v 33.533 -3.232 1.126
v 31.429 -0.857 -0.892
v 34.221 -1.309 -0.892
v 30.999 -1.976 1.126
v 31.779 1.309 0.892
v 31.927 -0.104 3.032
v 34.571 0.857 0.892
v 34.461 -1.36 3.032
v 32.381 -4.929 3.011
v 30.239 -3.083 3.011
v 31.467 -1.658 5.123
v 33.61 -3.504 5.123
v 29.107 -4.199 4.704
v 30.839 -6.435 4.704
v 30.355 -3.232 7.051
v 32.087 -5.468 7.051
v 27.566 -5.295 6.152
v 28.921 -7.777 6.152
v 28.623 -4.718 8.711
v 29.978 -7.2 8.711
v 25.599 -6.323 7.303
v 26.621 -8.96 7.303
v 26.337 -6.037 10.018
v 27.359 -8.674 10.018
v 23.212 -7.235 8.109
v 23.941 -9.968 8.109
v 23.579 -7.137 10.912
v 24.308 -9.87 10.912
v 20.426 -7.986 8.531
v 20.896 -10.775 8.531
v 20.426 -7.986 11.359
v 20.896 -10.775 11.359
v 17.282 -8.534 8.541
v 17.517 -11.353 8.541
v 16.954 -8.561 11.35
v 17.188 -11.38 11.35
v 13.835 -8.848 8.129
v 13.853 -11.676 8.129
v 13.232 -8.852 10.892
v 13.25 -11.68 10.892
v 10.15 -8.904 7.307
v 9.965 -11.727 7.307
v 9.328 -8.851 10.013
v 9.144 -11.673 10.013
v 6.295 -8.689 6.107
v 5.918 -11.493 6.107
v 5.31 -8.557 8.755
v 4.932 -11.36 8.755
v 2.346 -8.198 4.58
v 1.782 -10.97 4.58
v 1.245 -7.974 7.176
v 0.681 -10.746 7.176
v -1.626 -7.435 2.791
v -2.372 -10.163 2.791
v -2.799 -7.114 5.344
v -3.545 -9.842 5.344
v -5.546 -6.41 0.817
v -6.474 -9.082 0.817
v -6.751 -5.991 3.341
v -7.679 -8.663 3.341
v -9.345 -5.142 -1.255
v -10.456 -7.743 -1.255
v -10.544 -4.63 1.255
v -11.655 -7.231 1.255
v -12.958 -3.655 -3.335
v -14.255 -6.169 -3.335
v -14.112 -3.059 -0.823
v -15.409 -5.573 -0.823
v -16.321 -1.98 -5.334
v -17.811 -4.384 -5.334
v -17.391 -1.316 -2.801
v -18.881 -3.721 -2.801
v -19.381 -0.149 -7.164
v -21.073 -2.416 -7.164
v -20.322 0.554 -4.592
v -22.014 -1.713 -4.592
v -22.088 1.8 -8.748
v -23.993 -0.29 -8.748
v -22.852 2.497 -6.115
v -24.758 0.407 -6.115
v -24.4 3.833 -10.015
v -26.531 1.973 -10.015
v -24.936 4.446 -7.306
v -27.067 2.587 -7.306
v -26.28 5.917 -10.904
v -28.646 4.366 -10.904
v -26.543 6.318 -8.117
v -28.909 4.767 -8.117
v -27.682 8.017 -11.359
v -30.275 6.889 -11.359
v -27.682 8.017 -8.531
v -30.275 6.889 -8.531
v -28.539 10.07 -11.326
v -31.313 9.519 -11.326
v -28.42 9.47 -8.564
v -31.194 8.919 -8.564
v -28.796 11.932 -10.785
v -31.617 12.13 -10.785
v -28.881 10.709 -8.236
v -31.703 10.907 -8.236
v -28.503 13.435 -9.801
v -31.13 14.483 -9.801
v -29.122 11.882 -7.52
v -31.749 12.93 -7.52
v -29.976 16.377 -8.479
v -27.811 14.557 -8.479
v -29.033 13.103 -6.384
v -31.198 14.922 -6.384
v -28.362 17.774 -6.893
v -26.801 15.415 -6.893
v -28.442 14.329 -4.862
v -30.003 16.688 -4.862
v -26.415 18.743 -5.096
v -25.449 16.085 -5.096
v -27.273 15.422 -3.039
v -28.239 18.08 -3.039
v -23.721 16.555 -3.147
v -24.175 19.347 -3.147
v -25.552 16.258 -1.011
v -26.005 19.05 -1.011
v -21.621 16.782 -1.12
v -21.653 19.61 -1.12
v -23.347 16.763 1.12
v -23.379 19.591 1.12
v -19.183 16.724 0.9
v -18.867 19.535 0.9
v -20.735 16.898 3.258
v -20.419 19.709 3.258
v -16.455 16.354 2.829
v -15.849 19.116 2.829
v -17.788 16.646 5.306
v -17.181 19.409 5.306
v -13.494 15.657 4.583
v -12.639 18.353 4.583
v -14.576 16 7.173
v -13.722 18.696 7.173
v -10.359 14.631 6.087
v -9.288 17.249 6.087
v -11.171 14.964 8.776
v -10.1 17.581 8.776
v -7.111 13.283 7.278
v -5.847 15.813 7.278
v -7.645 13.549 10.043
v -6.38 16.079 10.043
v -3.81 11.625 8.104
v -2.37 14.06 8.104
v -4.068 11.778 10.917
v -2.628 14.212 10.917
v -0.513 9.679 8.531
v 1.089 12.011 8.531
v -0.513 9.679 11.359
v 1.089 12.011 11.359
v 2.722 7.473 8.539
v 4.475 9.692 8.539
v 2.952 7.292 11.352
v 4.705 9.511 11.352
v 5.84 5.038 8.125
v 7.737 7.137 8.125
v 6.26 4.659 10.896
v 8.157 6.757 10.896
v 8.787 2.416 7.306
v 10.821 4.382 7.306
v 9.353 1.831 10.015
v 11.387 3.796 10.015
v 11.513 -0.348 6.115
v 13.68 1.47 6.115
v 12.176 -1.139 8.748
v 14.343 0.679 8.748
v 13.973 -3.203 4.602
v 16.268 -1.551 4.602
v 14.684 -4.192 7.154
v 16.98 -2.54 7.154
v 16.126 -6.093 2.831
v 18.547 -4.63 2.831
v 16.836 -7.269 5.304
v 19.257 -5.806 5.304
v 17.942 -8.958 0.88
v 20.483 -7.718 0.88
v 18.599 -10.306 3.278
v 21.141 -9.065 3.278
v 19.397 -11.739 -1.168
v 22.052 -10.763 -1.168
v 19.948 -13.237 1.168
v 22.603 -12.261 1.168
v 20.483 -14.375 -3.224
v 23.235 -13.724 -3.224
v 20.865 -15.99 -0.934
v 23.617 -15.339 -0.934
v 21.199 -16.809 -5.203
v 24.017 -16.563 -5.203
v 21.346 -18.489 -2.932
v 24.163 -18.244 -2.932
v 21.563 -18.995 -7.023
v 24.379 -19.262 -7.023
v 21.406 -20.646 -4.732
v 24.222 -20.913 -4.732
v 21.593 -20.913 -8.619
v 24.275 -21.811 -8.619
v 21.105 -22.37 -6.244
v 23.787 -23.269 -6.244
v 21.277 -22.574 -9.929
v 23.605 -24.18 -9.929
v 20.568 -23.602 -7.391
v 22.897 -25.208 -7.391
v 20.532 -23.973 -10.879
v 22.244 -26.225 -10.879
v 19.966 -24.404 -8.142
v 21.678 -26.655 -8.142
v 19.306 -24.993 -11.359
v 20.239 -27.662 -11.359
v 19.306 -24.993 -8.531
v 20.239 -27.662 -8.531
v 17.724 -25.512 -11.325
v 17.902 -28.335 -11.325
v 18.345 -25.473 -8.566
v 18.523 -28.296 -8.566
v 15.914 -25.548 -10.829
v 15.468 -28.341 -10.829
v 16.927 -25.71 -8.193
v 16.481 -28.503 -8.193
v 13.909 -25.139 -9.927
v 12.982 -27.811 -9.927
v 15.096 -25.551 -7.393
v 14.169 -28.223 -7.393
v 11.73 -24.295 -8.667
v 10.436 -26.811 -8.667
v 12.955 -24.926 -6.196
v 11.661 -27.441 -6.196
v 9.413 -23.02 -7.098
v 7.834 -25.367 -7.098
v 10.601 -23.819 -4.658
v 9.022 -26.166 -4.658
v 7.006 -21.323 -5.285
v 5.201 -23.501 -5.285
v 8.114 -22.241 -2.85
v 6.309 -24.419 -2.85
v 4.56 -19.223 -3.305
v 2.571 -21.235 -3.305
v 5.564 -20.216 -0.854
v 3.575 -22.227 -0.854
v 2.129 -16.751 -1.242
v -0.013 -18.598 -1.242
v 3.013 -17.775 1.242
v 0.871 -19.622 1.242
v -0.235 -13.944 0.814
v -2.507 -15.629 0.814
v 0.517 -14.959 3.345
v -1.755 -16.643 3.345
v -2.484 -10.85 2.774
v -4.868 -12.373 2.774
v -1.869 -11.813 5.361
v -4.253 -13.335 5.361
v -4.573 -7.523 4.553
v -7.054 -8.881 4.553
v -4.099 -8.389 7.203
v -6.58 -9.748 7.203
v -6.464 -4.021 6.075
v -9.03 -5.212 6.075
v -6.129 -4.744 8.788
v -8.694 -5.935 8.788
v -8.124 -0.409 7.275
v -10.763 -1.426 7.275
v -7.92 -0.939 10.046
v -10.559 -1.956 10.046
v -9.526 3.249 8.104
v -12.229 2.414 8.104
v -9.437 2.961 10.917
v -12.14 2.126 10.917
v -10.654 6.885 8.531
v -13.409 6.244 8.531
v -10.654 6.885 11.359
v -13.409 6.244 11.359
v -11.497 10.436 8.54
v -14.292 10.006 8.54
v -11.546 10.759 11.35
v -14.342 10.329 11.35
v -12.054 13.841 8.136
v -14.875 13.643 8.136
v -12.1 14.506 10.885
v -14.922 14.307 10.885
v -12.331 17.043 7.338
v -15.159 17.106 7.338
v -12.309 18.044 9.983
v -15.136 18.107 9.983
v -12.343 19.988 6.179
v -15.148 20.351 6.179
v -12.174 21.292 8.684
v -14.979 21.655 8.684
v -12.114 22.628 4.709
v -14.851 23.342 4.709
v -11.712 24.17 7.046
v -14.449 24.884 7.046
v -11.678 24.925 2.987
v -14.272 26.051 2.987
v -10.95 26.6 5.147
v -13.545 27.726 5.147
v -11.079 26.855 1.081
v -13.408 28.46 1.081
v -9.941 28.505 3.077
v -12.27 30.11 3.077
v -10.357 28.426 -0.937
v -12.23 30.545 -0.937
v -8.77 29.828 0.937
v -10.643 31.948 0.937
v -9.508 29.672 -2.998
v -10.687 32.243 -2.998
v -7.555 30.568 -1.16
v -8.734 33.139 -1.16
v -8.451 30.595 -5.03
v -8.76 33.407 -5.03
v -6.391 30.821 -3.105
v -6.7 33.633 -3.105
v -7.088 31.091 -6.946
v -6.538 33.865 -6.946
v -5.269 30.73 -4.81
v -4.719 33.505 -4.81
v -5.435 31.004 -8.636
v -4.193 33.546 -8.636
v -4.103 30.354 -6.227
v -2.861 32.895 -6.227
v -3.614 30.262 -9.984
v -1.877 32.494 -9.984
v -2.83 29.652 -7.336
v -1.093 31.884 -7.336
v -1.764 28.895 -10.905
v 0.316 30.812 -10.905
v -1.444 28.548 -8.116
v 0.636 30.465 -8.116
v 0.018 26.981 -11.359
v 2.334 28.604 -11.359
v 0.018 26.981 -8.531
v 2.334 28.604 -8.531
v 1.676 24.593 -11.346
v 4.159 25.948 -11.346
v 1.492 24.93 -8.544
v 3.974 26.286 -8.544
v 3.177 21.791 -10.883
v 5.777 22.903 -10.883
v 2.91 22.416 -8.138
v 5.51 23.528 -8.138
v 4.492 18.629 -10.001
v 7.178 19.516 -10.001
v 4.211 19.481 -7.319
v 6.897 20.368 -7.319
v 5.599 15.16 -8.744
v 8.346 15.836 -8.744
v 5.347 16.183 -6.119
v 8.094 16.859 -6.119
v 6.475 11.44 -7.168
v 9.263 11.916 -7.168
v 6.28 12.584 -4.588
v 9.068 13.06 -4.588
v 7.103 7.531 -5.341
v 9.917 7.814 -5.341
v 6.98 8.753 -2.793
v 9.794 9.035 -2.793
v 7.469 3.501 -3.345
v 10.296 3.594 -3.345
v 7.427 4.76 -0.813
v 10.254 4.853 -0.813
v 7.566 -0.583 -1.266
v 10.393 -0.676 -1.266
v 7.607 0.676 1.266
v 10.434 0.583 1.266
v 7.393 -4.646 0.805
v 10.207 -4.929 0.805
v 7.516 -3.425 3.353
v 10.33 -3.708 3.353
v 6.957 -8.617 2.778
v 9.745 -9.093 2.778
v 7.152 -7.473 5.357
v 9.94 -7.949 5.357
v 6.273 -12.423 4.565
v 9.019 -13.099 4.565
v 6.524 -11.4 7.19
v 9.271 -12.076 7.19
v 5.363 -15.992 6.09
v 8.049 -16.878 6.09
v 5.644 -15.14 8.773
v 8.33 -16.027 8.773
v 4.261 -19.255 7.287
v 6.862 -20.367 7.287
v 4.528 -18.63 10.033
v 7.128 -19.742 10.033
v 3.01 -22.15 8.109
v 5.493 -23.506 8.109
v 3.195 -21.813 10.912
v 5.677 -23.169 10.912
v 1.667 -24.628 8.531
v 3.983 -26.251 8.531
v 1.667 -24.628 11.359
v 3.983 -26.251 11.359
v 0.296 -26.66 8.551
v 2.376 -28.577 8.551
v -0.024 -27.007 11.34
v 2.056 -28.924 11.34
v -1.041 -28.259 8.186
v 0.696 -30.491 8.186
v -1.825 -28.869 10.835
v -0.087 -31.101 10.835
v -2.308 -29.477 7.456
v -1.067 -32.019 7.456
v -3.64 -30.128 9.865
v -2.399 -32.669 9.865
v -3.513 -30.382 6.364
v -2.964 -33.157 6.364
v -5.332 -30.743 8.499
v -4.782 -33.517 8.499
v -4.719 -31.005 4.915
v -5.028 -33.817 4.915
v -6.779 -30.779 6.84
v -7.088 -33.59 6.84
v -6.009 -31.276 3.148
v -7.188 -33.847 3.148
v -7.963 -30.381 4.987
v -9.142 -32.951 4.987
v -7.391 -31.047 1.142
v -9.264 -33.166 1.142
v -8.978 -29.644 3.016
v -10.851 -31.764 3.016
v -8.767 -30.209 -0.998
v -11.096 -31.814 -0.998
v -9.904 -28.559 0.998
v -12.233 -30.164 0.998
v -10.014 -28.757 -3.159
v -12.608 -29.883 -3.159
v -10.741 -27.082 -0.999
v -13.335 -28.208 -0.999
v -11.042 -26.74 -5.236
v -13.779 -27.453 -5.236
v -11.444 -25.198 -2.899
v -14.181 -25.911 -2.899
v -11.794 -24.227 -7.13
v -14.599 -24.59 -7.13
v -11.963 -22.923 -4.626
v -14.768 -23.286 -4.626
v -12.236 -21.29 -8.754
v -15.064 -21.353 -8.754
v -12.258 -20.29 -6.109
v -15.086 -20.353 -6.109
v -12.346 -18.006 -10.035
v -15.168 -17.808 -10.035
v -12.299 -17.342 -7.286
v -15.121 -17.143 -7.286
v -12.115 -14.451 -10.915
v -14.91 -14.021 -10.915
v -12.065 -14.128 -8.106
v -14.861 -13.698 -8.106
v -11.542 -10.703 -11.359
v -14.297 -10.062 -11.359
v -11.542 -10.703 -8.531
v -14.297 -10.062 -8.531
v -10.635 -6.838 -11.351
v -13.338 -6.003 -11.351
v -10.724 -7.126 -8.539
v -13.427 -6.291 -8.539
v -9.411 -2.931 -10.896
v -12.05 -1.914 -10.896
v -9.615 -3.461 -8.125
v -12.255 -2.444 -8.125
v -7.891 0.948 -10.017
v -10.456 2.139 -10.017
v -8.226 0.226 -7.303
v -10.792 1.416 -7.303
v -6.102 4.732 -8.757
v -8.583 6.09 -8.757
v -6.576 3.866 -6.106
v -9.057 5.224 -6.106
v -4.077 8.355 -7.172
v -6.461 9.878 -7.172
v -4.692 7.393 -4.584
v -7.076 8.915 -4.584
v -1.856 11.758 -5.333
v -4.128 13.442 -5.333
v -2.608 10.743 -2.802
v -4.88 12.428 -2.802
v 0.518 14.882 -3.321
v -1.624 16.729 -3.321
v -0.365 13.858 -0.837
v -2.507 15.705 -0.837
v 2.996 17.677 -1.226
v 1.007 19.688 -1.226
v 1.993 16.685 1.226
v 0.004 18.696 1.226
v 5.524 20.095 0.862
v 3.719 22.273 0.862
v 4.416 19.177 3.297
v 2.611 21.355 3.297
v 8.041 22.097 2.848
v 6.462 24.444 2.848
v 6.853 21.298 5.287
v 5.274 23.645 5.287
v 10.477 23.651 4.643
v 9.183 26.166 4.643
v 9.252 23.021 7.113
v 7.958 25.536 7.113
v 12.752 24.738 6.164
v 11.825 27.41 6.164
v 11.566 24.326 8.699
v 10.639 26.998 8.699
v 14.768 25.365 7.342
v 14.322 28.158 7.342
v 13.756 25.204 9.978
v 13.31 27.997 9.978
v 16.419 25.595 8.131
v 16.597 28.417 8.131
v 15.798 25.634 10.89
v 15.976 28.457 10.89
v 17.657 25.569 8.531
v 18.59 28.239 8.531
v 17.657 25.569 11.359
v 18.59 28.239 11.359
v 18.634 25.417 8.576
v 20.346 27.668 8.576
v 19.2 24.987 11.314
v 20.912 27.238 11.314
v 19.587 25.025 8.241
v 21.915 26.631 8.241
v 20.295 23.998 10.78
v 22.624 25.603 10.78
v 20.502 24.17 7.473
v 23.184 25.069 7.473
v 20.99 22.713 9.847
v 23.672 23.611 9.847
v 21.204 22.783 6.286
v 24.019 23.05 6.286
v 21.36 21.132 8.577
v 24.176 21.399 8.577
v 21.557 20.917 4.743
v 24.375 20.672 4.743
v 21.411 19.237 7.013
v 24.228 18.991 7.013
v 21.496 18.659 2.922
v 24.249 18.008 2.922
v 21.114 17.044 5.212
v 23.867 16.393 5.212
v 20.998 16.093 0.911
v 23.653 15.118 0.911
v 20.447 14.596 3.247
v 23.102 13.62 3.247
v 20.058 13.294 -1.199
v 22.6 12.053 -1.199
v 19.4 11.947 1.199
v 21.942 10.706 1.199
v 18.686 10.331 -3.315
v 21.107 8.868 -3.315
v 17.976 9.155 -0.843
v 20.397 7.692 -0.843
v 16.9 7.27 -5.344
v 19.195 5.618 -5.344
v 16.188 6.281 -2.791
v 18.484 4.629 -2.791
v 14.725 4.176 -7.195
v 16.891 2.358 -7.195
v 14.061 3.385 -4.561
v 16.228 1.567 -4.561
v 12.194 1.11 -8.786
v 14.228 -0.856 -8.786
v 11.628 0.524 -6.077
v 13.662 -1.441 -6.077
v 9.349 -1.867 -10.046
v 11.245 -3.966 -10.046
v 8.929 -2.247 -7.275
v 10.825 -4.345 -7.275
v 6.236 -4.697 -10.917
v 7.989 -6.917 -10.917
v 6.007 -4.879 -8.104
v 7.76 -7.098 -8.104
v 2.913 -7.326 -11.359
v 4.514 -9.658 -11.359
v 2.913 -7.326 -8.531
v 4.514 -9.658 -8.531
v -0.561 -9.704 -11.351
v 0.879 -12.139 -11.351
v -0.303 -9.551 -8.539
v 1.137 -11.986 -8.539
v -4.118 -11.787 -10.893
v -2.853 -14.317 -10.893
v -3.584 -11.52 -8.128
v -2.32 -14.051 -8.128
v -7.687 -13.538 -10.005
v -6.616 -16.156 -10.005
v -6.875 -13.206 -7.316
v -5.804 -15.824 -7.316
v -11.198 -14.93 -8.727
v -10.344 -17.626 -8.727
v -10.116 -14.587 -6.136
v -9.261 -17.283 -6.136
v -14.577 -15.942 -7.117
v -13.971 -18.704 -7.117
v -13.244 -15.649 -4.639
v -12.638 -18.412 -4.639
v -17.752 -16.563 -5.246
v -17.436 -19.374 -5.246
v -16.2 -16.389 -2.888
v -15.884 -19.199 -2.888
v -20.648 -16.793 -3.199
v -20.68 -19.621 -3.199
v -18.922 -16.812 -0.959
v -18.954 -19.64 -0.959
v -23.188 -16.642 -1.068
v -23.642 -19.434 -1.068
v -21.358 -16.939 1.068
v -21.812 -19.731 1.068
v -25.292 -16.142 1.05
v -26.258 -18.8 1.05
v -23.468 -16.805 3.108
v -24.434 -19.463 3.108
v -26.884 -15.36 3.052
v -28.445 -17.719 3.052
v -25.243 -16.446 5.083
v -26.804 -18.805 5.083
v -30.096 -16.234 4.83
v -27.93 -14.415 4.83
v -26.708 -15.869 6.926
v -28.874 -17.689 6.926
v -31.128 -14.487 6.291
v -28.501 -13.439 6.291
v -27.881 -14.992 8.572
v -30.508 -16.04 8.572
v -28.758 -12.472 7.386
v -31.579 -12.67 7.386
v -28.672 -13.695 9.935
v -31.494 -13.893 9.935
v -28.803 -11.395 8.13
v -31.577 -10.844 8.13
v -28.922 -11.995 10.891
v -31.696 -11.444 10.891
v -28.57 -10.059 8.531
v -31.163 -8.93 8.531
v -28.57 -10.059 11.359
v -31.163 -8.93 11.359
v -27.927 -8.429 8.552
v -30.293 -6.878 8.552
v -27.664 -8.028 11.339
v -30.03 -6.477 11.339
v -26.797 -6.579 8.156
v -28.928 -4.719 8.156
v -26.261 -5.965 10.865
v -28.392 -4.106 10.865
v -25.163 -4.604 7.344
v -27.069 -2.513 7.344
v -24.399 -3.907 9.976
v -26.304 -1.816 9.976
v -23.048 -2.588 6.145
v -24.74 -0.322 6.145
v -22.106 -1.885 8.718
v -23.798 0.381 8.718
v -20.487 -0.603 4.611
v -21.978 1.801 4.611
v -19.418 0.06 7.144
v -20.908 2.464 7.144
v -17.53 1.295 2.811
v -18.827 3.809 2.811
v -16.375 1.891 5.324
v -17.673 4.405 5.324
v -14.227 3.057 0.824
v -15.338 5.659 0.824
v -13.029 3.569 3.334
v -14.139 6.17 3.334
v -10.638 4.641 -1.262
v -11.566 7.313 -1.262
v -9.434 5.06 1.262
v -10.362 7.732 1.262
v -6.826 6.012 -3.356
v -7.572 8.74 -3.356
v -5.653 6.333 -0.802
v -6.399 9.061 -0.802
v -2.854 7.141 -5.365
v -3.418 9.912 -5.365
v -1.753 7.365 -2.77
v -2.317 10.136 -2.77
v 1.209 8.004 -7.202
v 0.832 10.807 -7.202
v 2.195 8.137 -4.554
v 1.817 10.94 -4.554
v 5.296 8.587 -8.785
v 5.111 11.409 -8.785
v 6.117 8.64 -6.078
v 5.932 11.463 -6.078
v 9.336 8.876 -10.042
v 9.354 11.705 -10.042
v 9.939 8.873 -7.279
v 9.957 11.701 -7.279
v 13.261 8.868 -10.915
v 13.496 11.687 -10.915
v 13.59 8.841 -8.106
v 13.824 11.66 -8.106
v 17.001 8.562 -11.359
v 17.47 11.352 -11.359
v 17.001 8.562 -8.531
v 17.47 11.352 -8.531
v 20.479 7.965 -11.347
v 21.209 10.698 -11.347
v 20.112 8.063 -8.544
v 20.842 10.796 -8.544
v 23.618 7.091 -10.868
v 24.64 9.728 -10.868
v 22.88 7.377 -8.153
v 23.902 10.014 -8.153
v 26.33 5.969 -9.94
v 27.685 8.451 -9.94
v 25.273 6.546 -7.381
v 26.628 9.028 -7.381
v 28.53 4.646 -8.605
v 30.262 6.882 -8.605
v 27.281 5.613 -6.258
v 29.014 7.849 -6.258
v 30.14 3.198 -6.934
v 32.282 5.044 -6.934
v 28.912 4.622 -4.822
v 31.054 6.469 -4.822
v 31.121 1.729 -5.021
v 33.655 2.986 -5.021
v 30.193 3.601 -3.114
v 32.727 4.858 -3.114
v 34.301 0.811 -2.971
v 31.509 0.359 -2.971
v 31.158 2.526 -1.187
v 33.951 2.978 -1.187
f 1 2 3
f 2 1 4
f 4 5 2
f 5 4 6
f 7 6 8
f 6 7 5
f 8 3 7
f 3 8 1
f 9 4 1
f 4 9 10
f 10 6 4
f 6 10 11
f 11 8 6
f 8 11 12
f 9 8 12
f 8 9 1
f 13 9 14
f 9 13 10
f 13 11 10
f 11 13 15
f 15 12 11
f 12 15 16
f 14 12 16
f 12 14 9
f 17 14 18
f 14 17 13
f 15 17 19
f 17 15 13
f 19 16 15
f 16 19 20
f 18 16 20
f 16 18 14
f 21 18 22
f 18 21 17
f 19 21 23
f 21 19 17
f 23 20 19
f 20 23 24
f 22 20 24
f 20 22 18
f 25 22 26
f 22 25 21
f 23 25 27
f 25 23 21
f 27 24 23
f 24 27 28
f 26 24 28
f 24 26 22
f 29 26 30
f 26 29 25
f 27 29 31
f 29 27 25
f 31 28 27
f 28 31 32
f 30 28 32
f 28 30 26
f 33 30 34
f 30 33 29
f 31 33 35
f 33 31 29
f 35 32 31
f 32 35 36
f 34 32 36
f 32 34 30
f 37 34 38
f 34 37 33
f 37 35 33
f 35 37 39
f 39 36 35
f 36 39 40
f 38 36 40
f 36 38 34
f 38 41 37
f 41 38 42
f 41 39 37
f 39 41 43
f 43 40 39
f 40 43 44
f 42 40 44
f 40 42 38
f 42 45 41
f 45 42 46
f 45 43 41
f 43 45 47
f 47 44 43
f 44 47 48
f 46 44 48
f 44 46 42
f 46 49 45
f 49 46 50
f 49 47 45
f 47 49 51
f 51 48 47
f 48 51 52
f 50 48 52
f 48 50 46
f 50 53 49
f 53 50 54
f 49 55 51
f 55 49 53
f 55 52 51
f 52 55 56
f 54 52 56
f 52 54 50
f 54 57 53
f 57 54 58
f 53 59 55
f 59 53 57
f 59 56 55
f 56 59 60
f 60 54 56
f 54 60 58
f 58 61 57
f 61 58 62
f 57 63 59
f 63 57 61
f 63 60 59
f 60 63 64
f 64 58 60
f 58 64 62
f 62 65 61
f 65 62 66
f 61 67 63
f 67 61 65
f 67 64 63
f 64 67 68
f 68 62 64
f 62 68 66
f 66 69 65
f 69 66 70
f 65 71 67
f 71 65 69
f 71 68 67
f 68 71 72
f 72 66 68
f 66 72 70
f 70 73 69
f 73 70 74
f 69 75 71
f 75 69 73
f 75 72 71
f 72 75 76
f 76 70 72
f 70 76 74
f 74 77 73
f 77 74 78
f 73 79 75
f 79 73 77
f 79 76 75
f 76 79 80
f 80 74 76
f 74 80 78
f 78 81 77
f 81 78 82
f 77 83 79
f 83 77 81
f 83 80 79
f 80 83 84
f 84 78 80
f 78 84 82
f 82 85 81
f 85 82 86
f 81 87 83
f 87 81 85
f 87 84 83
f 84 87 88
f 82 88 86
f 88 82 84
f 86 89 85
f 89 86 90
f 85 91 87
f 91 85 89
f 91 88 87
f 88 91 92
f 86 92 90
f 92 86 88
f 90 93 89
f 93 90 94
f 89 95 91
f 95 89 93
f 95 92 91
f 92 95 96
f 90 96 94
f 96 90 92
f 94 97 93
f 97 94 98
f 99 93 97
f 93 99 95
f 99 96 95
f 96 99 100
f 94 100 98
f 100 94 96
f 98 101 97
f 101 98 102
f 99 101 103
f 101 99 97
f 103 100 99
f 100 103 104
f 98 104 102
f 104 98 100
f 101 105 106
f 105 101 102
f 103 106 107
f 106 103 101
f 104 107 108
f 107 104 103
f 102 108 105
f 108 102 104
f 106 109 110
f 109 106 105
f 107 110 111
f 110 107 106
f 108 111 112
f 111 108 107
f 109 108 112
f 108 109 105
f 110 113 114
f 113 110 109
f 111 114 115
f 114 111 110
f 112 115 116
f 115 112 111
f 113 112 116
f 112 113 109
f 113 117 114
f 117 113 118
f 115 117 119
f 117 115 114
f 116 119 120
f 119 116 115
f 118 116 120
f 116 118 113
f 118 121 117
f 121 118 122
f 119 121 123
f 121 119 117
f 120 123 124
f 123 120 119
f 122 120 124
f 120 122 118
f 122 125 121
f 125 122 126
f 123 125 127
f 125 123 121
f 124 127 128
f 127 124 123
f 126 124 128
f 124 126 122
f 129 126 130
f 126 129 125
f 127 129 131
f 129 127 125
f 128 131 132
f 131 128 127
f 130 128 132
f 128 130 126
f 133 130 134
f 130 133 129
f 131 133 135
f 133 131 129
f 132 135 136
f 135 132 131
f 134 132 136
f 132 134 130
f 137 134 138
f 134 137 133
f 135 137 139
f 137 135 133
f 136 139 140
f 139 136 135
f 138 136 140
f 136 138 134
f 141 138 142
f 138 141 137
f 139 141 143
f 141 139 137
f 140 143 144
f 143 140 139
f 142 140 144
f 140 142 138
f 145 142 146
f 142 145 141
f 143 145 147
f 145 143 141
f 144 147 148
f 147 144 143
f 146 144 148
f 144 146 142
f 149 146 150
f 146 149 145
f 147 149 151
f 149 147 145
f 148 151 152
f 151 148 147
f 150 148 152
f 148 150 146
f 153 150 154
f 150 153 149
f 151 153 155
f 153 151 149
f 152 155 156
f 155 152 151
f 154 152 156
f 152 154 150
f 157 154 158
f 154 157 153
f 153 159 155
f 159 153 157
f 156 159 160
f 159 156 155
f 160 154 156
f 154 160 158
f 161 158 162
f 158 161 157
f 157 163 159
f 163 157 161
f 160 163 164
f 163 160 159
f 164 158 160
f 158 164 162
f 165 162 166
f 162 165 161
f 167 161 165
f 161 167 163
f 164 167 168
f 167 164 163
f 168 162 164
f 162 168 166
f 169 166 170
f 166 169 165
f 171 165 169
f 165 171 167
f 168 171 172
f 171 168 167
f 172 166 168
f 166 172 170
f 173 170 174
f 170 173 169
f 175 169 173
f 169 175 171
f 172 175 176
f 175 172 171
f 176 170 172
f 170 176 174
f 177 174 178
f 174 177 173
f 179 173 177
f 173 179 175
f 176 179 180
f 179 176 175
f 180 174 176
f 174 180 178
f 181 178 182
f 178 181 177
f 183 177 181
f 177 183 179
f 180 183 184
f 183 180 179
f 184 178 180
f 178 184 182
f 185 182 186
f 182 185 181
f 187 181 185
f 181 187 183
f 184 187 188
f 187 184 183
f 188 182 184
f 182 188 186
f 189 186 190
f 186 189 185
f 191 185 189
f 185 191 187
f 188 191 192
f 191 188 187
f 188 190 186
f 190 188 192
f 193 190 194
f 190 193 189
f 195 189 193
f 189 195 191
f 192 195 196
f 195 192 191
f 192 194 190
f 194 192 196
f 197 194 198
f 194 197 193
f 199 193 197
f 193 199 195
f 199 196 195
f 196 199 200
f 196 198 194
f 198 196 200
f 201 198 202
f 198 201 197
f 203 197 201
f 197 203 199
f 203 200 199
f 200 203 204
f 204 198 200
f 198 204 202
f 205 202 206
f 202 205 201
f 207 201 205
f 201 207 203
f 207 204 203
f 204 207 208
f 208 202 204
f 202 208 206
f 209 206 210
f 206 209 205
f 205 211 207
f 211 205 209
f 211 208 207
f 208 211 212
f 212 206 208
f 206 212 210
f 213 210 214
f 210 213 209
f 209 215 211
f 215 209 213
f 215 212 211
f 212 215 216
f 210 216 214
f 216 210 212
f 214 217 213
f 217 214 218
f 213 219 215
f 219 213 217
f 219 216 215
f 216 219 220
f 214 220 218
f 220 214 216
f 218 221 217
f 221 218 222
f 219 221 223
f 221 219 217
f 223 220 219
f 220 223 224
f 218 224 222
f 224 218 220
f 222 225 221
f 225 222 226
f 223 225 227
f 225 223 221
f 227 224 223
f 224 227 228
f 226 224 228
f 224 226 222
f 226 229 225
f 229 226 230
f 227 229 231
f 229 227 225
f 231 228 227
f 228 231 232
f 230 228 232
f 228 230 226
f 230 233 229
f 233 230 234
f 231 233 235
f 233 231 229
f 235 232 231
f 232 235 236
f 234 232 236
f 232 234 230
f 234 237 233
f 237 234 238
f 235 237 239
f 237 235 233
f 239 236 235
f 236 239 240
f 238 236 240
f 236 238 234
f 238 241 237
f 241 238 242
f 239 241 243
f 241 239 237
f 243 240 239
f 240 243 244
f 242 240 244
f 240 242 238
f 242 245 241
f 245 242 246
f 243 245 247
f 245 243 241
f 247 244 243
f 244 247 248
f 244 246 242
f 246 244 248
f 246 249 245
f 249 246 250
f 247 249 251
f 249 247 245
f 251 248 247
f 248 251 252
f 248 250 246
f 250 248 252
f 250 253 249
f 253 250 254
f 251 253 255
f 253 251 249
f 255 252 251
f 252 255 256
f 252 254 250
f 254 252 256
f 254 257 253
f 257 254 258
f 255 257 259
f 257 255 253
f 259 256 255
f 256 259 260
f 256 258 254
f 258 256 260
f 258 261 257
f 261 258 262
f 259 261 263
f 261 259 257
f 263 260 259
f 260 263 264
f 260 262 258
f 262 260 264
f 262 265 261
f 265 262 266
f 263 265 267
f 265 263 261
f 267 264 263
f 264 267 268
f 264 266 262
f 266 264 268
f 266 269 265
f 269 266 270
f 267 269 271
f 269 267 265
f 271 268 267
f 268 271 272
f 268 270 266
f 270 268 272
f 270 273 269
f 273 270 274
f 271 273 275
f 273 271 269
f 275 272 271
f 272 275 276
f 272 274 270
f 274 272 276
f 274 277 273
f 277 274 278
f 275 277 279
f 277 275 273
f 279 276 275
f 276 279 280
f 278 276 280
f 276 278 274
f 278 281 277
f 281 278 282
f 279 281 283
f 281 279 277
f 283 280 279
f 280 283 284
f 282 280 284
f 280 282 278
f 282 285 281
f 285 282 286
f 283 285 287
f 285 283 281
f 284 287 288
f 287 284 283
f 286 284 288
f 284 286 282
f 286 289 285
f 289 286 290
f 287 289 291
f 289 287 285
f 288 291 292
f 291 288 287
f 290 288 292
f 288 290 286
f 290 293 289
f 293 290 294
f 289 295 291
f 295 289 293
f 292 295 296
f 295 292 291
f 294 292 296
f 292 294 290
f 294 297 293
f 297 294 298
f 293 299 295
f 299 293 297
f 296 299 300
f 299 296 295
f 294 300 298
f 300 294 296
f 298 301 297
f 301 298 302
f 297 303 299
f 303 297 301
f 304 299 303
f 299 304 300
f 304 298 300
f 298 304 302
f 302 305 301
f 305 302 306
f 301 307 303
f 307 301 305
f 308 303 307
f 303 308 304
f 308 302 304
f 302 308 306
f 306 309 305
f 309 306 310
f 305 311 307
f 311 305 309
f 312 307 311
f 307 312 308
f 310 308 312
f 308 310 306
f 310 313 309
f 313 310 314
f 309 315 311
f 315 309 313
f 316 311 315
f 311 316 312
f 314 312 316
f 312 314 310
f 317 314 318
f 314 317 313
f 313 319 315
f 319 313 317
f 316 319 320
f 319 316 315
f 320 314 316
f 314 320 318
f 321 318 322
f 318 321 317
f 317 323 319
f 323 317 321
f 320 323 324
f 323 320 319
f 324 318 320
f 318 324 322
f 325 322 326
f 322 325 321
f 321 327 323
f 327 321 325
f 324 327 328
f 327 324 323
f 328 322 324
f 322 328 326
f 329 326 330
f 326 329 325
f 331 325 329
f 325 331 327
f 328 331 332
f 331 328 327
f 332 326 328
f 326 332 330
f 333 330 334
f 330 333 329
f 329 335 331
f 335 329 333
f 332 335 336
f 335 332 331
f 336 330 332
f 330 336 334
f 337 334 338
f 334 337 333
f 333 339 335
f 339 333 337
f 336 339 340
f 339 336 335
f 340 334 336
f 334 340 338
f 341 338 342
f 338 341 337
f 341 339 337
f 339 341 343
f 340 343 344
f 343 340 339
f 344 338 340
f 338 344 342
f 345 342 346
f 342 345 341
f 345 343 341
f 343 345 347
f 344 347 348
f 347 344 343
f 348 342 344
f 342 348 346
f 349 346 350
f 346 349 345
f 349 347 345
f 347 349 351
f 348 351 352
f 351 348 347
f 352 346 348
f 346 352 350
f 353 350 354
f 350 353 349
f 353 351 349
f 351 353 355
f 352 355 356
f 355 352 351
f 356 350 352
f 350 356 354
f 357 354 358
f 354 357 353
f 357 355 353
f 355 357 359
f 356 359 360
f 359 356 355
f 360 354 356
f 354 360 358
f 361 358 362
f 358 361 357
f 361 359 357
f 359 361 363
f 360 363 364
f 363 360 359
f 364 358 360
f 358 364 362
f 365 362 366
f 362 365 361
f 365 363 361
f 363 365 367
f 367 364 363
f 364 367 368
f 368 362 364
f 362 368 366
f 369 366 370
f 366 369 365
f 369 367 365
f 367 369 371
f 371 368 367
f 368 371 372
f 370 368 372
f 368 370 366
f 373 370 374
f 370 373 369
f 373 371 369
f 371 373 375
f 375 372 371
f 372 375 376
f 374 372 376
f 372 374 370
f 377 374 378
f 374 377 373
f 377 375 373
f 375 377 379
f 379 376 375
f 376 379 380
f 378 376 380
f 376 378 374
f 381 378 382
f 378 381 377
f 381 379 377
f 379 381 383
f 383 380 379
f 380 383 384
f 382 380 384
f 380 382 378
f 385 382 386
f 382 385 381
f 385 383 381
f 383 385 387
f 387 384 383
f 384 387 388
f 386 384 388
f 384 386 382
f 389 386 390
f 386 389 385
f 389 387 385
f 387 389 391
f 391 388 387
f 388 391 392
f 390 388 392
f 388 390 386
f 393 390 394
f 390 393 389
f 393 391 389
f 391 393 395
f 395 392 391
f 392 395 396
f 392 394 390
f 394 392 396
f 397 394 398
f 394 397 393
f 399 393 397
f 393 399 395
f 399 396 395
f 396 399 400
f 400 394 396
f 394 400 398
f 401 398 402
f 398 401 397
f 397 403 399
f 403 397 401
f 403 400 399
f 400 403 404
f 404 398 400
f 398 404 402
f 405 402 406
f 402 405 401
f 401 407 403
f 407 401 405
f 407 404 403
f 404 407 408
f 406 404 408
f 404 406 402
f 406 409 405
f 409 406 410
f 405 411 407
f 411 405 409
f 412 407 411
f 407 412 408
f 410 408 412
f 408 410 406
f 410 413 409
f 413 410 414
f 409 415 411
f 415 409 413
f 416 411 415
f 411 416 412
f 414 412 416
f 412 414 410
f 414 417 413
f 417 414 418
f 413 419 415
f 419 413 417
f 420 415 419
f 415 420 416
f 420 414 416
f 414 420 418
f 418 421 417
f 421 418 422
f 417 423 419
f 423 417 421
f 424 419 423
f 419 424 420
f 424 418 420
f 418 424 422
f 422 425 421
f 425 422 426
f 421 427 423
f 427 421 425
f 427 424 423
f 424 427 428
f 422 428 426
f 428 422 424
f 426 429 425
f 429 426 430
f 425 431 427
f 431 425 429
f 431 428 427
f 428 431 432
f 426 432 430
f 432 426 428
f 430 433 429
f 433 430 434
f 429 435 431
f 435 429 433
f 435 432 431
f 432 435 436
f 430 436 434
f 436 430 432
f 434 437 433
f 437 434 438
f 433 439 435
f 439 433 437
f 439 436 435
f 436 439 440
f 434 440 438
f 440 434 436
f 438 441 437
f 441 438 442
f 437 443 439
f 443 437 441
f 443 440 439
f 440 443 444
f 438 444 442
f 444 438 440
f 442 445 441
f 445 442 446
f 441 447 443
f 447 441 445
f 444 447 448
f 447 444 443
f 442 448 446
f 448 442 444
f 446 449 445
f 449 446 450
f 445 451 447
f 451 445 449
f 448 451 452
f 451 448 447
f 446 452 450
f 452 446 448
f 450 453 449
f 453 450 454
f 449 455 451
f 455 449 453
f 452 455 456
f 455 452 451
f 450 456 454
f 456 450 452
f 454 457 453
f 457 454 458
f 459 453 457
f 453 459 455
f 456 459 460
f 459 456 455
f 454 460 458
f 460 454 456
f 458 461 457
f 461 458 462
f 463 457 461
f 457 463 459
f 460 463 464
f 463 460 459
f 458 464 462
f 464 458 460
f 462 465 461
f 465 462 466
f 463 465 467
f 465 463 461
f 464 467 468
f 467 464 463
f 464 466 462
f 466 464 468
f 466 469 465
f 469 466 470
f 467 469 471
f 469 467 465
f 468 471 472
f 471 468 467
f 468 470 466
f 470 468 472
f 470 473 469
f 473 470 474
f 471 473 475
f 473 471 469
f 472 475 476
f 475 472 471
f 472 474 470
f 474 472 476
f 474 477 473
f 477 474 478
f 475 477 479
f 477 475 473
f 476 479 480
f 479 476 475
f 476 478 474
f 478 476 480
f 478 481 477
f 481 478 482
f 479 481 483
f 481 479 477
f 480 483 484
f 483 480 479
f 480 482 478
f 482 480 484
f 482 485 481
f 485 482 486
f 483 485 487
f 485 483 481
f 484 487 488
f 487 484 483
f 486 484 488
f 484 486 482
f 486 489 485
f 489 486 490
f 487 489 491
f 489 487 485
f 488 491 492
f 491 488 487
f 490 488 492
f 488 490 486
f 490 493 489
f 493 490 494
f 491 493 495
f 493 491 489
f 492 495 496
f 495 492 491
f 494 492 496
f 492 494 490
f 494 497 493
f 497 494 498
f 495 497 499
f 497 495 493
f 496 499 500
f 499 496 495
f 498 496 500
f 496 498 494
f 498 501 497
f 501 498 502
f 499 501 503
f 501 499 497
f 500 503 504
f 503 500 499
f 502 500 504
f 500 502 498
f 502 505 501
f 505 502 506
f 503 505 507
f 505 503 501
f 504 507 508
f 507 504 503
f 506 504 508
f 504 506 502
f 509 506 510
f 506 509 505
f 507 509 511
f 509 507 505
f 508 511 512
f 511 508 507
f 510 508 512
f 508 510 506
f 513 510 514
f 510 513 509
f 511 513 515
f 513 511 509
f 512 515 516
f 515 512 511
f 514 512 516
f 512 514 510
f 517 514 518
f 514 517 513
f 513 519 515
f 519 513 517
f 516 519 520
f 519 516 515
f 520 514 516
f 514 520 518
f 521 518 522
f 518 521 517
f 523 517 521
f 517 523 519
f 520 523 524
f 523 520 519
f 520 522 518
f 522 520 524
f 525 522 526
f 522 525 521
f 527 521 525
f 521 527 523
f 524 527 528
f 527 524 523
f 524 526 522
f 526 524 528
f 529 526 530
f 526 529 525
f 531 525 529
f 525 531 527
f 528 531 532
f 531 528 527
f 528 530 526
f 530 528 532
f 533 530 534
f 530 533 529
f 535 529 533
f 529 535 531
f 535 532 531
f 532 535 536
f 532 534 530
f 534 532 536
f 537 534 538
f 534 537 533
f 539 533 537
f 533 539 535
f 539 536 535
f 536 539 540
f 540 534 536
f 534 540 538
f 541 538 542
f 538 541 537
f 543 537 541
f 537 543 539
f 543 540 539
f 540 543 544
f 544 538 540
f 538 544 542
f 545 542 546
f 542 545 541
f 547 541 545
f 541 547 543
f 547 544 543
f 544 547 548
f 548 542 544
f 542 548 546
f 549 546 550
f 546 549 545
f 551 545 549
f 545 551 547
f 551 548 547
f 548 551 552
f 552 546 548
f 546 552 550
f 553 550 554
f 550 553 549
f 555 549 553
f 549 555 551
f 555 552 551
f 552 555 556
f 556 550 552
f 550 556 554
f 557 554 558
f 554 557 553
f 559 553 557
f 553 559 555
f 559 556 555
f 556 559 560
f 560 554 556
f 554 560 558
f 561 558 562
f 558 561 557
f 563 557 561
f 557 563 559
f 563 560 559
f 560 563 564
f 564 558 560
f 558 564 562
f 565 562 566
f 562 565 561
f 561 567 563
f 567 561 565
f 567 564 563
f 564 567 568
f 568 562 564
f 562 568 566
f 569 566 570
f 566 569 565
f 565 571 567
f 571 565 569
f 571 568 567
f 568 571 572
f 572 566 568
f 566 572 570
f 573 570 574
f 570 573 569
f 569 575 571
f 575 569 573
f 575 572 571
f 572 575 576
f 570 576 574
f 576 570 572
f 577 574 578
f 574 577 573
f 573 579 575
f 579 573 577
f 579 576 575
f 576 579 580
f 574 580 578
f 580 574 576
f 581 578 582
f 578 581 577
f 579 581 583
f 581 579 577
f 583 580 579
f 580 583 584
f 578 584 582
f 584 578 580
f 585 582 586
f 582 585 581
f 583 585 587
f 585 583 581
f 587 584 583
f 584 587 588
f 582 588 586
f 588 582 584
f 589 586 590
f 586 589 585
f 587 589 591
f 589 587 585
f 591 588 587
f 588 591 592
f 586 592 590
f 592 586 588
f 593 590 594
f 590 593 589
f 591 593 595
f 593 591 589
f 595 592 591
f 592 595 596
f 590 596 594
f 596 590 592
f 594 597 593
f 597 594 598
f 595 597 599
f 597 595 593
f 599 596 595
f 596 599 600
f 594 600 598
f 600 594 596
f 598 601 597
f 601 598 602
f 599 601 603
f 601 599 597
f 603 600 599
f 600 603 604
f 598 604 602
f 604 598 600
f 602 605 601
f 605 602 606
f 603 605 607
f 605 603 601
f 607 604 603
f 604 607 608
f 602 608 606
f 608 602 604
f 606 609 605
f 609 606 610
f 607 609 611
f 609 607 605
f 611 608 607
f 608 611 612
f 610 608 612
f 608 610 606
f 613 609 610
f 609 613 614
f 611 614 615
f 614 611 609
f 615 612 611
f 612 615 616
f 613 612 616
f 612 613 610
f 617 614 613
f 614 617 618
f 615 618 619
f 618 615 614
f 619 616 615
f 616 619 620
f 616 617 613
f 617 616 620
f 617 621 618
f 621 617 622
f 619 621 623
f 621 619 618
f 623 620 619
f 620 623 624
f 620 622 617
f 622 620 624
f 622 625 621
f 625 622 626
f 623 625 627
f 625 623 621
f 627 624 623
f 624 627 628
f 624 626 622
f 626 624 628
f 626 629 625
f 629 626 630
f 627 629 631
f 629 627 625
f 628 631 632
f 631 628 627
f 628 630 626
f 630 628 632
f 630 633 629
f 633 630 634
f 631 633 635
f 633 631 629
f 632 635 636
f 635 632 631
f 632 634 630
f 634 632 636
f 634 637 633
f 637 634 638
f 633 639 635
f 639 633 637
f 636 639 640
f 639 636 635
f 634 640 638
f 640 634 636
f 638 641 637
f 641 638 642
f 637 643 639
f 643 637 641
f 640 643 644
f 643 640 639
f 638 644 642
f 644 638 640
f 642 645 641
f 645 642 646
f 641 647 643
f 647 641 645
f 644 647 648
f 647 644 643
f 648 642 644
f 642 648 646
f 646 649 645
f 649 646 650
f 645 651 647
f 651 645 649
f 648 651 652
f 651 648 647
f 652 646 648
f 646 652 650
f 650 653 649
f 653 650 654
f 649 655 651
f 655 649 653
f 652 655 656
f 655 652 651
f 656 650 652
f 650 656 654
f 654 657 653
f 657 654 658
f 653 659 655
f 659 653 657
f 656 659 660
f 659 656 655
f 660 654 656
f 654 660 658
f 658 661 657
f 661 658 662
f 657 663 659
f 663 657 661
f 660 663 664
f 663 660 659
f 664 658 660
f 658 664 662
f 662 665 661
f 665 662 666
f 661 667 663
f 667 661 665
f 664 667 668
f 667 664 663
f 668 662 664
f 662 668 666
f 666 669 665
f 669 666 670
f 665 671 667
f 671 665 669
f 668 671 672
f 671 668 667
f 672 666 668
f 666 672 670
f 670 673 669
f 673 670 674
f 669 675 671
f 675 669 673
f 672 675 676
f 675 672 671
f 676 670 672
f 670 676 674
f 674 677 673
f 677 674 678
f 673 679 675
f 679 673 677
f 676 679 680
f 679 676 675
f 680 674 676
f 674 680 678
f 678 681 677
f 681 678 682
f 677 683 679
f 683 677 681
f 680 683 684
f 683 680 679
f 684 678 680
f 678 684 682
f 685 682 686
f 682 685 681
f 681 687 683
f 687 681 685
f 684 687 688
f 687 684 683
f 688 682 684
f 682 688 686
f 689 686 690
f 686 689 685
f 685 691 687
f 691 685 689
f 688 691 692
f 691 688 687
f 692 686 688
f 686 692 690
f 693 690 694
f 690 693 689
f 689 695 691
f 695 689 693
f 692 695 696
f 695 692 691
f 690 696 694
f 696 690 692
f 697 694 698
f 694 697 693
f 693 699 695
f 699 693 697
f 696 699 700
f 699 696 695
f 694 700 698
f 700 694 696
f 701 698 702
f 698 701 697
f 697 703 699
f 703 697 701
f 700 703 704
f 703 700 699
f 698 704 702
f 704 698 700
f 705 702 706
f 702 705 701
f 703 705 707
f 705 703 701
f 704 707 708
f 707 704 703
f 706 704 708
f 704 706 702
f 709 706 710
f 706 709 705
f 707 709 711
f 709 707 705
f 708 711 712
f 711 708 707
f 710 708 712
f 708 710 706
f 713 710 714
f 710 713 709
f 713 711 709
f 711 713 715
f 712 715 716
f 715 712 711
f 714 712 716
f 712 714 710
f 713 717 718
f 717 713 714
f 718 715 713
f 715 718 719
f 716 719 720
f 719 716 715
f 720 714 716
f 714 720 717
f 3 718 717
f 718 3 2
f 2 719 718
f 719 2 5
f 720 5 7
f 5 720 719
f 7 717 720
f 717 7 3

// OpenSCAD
/*
    remix of "Celtic knots as Lissajous knots"
    by Kit Wallace
    https://www.thingiverse.com/thing:2257185

    and curve definitions from "Customizable curve generator"
    by kakaroto
    https://www.thingiverse.com/thing:50249

    to create Spirograph (and other) Knots
*/
function GCD(a,b) = (a==0)?b:GCD(b%a,a);
function LCM(a,b) = a*b/GCD(a,b);

shape=0;// [ 0:circle on inside = Hypotrochoid, 1:circle on outside = Epitrochoid, 2:Rhodonea_curve, 3:Epicycloid, 4:Hypocycloid ]

// radius of ring
Ring_Radius=7; // [1:30]
// radius of moving circle
Circle_Radius=3; // [1:30]
// distance of pen from circle center
Circle_Distance=7; // [1:30]
// multiple of angle to draw z
Angle_Multiple=2; // [1:5]
// divisor of angle to draw z
Angle_Divisor=1; // [1:5]

// Sides of rope - must be a divisor of 360
Sides=4; // [3,4,5,6,8,9,10,12,15,30,45,60]
// decrease for finer details
Step = 6; // [0.8:0.2:10]
// x scaling
vx = 3.0; // [1.0:0.5:20]
// y scaling
vy = 3.0; // [1.0:0.5:20]
// z scaling
vz = 10.0; // [2:60]
// Rope diameter
Rope_Radius=1.0; // [0.1:0.1:5.0]
// true if knot is open or partial
Open = false; // [false,true]

// phase angle for profile (matters for low Sides)
Phase = 45; // [0:5:180]

/* [Hidden] */
// change for partial path 
Start=0; // [0:360]
// change for partial path
End=360*LCM(Ring_Radius,Circle_Radius)/Ring_Radius;
// create a tube as a polyhedron 
// tube can be open or closed

// polyhedron constructor

function poly(name,vertices,faces,debug=[],partial=false) = 
    [name,vertices,faces,debug,partial];

function p_name(obj) = obj[0];
function p_vertices(obj) = obj[1];
function p_faces(obj) = obj[2];
  
module show_solid(obj) {
    polyhedron(p_vertices(obj),p_faces(obj),convexity=10);
};

// utility functions  
function m_translate(v) = [ [1, 0, 0, 0],
                            [0, 1, 0, 0],
                            [0, 0, 1, 0],
                            [v.x, v.y, v.z, 1  ] ];
                            
function m_rotate(v) =  [ [1,  0,         0,        0],
                          [0,  cos(v.x),  sin(v.x), 0],
                          [0, -sin(v.x),  cos(v.x), 0],
                          [0,  0,         0,        1] ]
                      * [ [ cos(v.y), 0,  -sin(v.y), 0],
                          [0,         1,  0,        0],
                          [ sin(v.y), 0,  cos(v.y), 0],
                          [0,         0,  0,        1] ]
                      * [ [ cos(v.z),  sin(v.z), 0, 0],
                          [-sin(v.z),  cos(v.z), 0, 0],
                          [ 0,         0,        1, 0],
                          [ 0,         0,        0, 1] ];
                            
function vec3(v) = [v.x, v.y, v.z];
function transform(v, m)  = vec3([v.x, v.y, v.z, 1] * m);
                            
function orient_to(centre,normal, p) = m_rotate([0, atan2(sqrt(pow(normal.x, 2) + pow(normal.y, 2)), normal.z), 0]) 
                     * m_rotate([0, 0, atan2(normal[1], normal[0])]) 
                     * m_translate(centre);

// solid from path


function circle_points(r, sides,phase=45) = 
    let (delta = 360/sides)
    [for (i=[0:sides-1]) [r * sin(i*delta + phase), r *  cos(i*delta+phase), 0]];

function loop_points(step,min=0,max=360) = 
    [for (t=[min:step:max-step]) f(t)];

function transform_points(list, matrix, i = 0) = 
    i < len(list) 
       ? concat([ transform(list[i], matrix) ], transform_points(list, matrix, i + 1))
       : [];

function tube_points(loop, circle_points,  i = 0) = 
    (i < len(loop) - 1)
     ?  concat(transform_points(circle_points, orient_to(loop[i], loop[i + 1] - loop[i] )), 
               tube_points(loop, circle_points, i + 1)) 
     : transform_points(circle_points, orient_to(loop[i], loop[0] - loop[i] )) ;

function loop_faces(segs, sides, open=false) = 
   open 
     ?  concat(
         [[for (j=[sides - 1:-1:0]) j ]],
         [for (i=[0:segs-3]) 
          for (j=[0:sides -1])  
             [ i * sides + j, 
               i * sides + (j + 1) % sides, 
              (i + 1) * sides + (j + 1) % sides, 
              (i + 1) * sides + j
             ]
        ] ,   
        [[for (j=[0:1:sides - 1]) (segs-2)*sides  + j]]
        )
     : [for (i=[0:segs]) 
        for (j=[0:sides -1])  
         [ i * sides + j, 
          i * sides + (j + 1) % sides, 
          ((i + 1) % segs) * sides + (j + 1) % sides, 
          ((i + 1) % segs) * sides + j
         ]   
       ]  
     ;

//  path with hulls

module hulled_path(path,r) {
    for (i = [0 : 1 : len(path) - 1 ]) {
        hull() {
            translate(path[i]) sphere(r);
            translate(path[(i + 1) % len(path)]) sphere(r);
        }
    }
};

// smoothed path by interpolate between points 

weight = [-1, 9, 9, -1] / 16;

function interpolate(path,n,i) =
        path[(i + n - 1) %n] * weight[0] +
        path[i]             * weight[1] +
        path[(i + 1) %n]    * weight[2] +
        path[(i + 2) %n]    * weight[3] ;

function subdivide(path,i=0) = 
    i < len(path) 
     ? concat([path[i]], 
              [interpolate(path,len(path),i)],
              subdivide(path, i+1))
     : [];

function smooth(path,n) =
    n == 0
     ?  path
     :  smooth(subdivide(path),n-1);


function path_segment(path,start,end) =
    let (l = len(path))
    let (s = max(floor(start * 360 / l),0),
         e = min(ceil(end * 360 / l),l - 1))
    [for (i=[s:e]) path[i]];


function scale(path,scale,i=0) =
    i < len(path)
      ?  concat( 
           [[path[i][0]*scale[0],path[i][1]*scale[1],path[i][2]*scale[2]]], 
           scale(path,scale,i+1)
         )
      :  [];

function curve_length(step,t=0) =
    t < 360
      ?  norm(f(t+step) - f(t)) + curve_length(step,t+step)
      :  0;

function map(t, min, max) =
      min + t* (max-min)/360;
    
//  create a knot from a path 

function path_knot(path,r,sides,kscale,phase=45,open=false)  =
  let(loop_points = scale(path,kscale))
  let(circle_points = circle_points(r,sides,phase))
  let(tube_points = tube_points(loop_points,circle_points))
  let(loop_faces = loop_faces(len(loop_points),sides,open))
  poly(name="Knot",
         vertices = tube_points,
         faces = loop_faces);

 // render_type function-1
           
R=2*Rope_Radius;

function Epicycloid(t,a,b,c,m) =
    [ (a+b)*cos(t)-b*cos(((a/b)+1)*t),
      (a+b)*sin(t)-b*sin(((a/b)+1)*t),
      sin(m*t)
    ];

function Epitrochoid(t,a,b,c,m) =
    [ (a+b)*cos(t)-c*cos(((a/b)+1)*t),
      (a+b)*sin(t)-c*sin(((a/b)+1)*t),
      sin(m*t)
    ];

function Hypocycloid(t,a,b,c,m) =
    [ (a-b)*cos(t)+b*cos(((a/b)-1)*t),
      (a-b)*sin(t)-b*sin(((a/b)-1)*t),
      sin(m*t)
    ];

function Hypotrochoid(t,a,b,c,m) =
    [ (a-b)*cos(t)+c*cos(((a/b)-1)*t),
      (a-b)*sin(t)-c*sin(((a/b)-1)*t),
      sin(m*t)
    ];

function Rhodonea_curve(t,a,b,c,m) =
    [ (a+b)*cos(a/b*t)*sin(t),
      (a+b)*cos(a/b*t)*cos(t),
      sin(m*t)
    ];

function f(t) =
(shape == 0) ? Hypotrochoid(t,Ring_Radius,Circle_Radius,Circle_Distance,Angle_Multiple/Angle_Divisor) :
(shape == 1) ? Epitrochoid(t,Ring_Radius,Circle_Radius,Circle_Distance,Angle_Multiple/Angle_Divisor) :
(shape == 2) ? Rhodonea_curve(t,Ring_Radius,Circle_Radius,Circle_Distance,Angle_Multiple/Angle_Divisor) :
(shape == 3) ? Epicycloid(t,Ring_Radius,Circle_Radius,Circle_Distance,Angle_Multiple/Angle_Divisor) :
(shape == 4) ? Hypocycloid(t,Ring_Radius,Circle_Radius,Circle_Distance,Angle_Multiple/Angle_Divisor) :
0;

Kscale=[vx,vy,vz];

Paths = [loop_points(Step,Start,End)];
for (k =[0:len(Paths) - 1]) {
   path = Paths[k];
   knot= path_knot(path,R,Sides,Kscale,Phase,Open);
   solid1=knot;  // apply transformations here
   show_solid(solid1);
};
